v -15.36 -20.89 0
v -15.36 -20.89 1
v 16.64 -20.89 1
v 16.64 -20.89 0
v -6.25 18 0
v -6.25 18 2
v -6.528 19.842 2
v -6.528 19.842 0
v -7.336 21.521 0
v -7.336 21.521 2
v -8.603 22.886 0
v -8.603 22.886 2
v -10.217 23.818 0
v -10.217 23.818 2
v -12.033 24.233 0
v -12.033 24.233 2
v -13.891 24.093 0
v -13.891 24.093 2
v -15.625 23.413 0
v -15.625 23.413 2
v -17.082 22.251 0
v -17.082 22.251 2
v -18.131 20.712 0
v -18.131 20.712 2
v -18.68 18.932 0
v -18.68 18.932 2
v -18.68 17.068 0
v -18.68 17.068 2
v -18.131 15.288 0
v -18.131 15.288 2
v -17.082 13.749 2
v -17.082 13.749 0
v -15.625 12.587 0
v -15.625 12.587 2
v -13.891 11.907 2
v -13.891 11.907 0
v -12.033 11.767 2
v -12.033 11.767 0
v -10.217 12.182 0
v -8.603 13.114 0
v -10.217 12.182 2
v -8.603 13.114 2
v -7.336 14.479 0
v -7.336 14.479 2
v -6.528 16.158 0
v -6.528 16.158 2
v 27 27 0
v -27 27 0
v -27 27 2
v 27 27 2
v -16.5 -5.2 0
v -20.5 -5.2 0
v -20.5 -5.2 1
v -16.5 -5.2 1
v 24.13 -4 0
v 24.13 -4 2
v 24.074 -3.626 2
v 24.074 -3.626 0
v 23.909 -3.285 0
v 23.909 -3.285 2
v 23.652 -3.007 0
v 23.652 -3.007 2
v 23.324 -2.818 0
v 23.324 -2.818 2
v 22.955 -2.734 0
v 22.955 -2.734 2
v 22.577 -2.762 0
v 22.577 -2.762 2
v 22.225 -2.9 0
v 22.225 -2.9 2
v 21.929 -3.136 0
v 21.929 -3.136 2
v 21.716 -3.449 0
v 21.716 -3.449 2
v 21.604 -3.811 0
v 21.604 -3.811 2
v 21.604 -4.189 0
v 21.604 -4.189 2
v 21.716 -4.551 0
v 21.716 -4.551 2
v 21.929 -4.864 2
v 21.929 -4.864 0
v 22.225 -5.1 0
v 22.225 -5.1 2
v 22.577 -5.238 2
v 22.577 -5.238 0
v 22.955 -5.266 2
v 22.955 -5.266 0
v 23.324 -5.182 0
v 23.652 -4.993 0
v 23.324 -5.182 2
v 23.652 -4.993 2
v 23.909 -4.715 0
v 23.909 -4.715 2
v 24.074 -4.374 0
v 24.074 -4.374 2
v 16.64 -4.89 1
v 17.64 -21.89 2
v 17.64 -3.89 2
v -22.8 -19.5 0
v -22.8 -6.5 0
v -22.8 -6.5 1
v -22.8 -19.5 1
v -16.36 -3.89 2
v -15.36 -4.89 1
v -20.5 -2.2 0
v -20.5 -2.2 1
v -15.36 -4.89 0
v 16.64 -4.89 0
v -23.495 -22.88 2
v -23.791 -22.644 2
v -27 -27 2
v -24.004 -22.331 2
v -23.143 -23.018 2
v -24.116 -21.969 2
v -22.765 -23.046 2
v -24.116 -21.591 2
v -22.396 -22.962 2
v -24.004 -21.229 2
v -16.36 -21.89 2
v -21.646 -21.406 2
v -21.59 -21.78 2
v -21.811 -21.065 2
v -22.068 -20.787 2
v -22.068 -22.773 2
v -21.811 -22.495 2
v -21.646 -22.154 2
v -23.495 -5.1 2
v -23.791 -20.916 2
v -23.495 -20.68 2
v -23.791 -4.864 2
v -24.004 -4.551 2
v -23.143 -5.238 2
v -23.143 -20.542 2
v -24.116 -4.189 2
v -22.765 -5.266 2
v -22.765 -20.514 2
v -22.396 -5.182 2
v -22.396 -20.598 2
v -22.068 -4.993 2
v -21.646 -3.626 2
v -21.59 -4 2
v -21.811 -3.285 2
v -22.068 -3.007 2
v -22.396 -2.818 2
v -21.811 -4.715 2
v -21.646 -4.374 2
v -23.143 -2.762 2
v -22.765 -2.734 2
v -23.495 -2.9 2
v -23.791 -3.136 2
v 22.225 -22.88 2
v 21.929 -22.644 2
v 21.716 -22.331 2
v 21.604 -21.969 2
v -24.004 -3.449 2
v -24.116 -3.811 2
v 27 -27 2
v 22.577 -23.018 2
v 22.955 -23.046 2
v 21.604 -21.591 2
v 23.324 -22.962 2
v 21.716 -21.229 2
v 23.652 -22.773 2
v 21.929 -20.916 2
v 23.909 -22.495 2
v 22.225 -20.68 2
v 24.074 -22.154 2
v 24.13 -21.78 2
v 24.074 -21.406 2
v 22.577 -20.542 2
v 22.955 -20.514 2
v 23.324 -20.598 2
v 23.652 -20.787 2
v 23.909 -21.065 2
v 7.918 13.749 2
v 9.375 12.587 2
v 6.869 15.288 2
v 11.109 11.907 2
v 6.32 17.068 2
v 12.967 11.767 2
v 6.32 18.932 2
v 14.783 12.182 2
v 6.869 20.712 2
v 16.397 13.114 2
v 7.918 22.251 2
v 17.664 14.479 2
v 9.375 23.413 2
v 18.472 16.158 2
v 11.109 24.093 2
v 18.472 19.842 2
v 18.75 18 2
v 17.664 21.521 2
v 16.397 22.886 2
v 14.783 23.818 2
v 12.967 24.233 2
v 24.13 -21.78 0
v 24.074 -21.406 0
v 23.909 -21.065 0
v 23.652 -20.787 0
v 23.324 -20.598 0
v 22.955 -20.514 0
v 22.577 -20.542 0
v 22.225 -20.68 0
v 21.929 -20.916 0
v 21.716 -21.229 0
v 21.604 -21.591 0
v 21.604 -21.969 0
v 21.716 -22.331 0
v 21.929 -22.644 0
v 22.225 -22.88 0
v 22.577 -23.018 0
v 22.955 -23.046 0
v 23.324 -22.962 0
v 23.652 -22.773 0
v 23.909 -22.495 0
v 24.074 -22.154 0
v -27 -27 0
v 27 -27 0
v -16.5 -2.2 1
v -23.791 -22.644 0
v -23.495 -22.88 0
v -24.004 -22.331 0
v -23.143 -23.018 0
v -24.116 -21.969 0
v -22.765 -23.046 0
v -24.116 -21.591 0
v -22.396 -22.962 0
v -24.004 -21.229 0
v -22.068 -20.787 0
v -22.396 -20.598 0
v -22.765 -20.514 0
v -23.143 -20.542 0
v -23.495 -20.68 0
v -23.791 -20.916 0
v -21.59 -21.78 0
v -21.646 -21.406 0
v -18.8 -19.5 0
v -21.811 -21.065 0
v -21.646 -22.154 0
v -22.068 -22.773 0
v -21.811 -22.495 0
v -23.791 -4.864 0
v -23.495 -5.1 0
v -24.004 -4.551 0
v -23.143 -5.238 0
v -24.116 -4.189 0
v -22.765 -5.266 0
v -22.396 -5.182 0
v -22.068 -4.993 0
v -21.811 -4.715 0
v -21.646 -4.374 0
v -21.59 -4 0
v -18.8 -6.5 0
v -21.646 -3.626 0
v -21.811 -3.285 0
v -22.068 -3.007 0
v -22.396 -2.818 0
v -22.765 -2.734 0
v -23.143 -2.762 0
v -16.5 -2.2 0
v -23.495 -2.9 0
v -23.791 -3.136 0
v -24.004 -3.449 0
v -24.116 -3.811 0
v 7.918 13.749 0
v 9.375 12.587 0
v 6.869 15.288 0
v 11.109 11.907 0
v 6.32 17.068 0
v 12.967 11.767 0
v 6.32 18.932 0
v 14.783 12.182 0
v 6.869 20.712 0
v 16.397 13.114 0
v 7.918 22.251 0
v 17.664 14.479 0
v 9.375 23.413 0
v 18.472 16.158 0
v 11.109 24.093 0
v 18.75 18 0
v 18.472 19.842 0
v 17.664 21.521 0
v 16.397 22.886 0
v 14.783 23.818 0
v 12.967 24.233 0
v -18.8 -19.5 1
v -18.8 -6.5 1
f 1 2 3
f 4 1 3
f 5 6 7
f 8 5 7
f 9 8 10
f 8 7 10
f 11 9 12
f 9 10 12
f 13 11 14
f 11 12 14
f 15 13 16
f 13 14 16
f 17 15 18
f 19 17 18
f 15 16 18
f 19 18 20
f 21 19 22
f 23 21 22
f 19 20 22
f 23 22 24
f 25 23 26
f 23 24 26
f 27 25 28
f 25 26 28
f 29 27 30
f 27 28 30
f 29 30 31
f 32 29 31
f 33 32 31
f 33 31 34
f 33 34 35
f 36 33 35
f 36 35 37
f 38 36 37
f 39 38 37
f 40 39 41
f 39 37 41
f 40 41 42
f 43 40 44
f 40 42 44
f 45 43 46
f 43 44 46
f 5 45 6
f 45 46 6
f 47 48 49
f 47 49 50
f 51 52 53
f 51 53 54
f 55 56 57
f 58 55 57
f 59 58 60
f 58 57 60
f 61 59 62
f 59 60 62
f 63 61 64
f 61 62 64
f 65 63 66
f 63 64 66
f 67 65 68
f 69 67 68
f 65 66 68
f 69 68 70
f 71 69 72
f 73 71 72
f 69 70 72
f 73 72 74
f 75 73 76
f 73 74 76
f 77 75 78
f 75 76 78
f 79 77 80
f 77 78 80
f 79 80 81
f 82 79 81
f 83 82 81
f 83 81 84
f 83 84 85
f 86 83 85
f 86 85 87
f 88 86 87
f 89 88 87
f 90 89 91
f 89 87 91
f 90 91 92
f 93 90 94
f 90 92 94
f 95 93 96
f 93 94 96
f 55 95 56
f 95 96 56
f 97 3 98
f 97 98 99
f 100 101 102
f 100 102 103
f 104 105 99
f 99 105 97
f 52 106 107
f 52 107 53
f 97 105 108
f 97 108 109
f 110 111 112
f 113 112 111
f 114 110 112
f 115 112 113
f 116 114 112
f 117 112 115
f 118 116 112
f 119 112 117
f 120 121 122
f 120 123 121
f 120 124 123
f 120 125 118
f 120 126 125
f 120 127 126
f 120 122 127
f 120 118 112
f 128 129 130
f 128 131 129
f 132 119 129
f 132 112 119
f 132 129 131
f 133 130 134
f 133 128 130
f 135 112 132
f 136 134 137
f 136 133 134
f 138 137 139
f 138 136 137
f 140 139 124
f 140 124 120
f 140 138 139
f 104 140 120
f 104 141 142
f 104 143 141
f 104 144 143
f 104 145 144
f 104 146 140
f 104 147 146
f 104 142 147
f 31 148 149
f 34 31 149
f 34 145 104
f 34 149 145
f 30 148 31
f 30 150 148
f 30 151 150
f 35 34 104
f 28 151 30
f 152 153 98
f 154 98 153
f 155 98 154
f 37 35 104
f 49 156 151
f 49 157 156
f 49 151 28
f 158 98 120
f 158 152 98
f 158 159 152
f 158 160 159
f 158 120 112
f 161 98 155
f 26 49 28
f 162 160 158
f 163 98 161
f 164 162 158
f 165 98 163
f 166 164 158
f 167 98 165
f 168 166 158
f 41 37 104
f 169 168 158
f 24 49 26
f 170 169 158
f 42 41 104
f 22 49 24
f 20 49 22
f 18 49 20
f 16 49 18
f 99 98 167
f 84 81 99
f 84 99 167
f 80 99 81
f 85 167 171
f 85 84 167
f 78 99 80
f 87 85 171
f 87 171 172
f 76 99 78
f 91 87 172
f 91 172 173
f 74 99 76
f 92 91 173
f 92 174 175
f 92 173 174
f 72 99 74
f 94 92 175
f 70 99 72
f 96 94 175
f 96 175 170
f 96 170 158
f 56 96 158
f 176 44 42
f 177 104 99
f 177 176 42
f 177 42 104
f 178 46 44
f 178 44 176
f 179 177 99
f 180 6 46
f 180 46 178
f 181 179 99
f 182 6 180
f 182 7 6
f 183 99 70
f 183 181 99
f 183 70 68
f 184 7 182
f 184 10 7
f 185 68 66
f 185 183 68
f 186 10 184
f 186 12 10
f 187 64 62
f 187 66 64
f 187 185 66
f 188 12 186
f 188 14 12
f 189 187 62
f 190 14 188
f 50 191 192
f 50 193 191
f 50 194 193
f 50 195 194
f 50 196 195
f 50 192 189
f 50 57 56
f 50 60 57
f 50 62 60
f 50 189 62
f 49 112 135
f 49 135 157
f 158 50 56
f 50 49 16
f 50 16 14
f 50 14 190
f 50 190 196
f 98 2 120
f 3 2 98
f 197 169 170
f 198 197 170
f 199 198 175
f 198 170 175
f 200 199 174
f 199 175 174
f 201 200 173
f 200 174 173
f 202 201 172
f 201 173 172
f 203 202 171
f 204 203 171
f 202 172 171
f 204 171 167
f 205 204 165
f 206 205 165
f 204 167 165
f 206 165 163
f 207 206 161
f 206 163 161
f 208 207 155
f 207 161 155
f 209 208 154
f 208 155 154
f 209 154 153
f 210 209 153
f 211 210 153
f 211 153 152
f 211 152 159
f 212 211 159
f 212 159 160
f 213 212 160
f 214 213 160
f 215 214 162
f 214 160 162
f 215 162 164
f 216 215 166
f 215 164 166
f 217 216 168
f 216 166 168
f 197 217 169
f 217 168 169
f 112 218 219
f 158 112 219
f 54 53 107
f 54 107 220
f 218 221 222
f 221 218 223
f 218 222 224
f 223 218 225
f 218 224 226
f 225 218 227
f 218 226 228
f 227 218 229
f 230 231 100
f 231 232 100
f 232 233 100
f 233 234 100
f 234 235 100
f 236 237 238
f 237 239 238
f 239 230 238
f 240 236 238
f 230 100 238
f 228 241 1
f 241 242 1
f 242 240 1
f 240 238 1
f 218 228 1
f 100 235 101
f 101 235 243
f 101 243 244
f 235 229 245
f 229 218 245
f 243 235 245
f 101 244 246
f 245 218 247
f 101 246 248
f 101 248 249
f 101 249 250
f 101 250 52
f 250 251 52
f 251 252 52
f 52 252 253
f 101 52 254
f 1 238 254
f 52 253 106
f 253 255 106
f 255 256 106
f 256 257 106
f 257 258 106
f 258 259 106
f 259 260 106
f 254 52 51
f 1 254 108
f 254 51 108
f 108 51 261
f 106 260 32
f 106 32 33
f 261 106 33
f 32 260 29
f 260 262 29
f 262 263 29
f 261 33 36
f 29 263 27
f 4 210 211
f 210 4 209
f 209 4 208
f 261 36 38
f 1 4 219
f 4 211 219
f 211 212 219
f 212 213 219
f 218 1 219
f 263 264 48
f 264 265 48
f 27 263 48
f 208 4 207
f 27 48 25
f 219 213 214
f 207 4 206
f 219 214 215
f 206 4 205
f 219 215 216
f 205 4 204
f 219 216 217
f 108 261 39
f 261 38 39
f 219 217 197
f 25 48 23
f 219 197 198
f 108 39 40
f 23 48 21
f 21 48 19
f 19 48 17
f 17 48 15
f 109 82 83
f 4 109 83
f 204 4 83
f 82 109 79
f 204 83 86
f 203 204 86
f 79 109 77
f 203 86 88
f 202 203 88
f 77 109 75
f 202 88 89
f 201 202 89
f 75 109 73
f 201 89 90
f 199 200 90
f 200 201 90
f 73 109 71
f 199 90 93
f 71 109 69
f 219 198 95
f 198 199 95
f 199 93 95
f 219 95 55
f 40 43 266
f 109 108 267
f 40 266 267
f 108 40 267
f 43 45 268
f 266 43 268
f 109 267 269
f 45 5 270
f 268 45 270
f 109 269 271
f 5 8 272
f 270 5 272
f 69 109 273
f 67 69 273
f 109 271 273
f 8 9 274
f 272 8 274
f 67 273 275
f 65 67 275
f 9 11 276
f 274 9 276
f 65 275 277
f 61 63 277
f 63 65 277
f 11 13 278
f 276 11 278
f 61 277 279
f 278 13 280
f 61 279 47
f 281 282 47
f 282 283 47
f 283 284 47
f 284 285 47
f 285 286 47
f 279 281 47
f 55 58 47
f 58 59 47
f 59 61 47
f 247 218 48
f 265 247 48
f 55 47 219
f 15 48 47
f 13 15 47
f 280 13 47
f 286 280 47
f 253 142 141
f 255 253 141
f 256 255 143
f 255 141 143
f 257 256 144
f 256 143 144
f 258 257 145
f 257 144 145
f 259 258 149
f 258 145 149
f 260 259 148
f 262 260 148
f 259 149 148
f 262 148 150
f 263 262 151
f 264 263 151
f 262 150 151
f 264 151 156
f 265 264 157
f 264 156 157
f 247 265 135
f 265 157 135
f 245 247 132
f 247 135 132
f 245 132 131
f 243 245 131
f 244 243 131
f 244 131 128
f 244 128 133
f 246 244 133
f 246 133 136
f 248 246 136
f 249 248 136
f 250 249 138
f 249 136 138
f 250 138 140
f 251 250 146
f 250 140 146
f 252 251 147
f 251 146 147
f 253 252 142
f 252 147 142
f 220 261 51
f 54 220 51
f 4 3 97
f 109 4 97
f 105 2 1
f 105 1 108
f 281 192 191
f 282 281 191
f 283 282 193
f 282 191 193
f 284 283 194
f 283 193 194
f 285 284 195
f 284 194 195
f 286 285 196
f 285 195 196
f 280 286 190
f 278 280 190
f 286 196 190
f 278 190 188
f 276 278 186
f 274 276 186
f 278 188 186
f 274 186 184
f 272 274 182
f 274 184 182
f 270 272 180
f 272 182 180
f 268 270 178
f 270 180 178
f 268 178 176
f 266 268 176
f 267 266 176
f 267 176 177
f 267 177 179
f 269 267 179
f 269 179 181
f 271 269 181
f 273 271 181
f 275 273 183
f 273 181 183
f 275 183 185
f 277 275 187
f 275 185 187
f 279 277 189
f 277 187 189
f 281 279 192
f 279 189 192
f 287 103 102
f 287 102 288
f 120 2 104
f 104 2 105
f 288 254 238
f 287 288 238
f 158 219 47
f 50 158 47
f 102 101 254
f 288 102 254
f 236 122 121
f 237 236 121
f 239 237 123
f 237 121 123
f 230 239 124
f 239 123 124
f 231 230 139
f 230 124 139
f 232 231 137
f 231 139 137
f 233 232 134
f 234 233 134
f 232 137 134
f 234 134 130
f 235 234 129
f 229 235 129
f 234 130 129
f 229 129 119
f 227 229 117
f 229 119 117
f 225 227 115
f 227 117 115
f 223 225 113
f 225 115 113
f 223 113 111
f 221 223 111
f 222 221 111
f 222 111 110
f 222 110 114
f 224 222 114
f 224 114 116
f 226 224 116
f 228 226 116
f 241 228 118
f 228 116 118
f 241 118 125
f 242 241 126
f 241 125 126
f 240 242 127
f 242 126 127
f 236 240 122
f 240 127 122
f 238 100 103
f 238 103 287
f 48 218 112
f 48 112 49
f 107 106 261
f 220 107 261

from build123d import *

# Parameters (mm, degrees)
SKETCH_W        = 54
SKETCH_H        = 54
PAD_DEPTH       = 2
SKETCH001_R     = 1.27
SKETCH001_R_2   = 6.25
SKETCH001_W     = 32
SKETCH001_H     = 16
POCKET_DEPTH    = 2
CHAMFER_SIZE    = 1
SKETCH006_W     = 4
SKETCH006_H     = 13
SKETCH006_H_2   = 3
POCKET004_DEPTH = 1


with BuildPart() as part:
    # Sketch → Pad (new body)
    with BuildSketch(Plane.XY):
        Rectangle(SKETCH_W, SKETCH_H)
    extrude(amount=PAD_DEPTH)

    # Sketch001 (on Face6 of Pad) → Pocket (cut)
    with BuildSketch(Plane.XY.offset(2)):
        with Locations((-22.86, -4)):
            Circle(SKETCH001_R)
        with Locations((22.86, -4)):
            Circle(SKETCH001_R)
        with Locations((22.86, -21.78)):
            Circle(SKETCH001_R)
        with Locations((-22.86, -21.78)):
            Circle(SKETCH001_R)
        with Locations((-12.5, 18)):
            Circle(SKETCH001_R_2)
        with Locations((12.5, 18)):
            Circle(SKETCH001_R_2)
        with Locations((0.64, -12.89)):
            Rectangle(SKETCH001_W, SKETCH001_H)
    extrude(amount=-POCKET_DEPTH, mode=Mode.SUBTRACT)

    # Chamfer
    chamfer_edges = [part.edges().sort_by_distance(p)[0] for p in [
        (0.64, -20.89, 2),
        (-15.36, -12.89, 2),
        (0.64, -4.89, 2),
        (16.64, -12.89, 2),
    ]]
    chamfer(chamfer_edges, length=CHAMFER_SIZE)

    # Sketch006 (on Face20 of Chamfer) → Pocket004 (cut)
    with BuildSketch(Plane(origin=(0, 0, 0), x_dir=(1, 0, 0), z_dir=(0, 0, -1))):
        with Locations((-20.8, 13)):
            Rectangle(SKETCH006_W, SKETCH006_H)
        with Locations((-18.5, 3.7)):
            Rectangle(SKETCH006_W, SKETCH006_H_2)
    extrude(amount=-POCKET004_DEPTH, mode=Mode.SUBTRACT)


solid = part.part
